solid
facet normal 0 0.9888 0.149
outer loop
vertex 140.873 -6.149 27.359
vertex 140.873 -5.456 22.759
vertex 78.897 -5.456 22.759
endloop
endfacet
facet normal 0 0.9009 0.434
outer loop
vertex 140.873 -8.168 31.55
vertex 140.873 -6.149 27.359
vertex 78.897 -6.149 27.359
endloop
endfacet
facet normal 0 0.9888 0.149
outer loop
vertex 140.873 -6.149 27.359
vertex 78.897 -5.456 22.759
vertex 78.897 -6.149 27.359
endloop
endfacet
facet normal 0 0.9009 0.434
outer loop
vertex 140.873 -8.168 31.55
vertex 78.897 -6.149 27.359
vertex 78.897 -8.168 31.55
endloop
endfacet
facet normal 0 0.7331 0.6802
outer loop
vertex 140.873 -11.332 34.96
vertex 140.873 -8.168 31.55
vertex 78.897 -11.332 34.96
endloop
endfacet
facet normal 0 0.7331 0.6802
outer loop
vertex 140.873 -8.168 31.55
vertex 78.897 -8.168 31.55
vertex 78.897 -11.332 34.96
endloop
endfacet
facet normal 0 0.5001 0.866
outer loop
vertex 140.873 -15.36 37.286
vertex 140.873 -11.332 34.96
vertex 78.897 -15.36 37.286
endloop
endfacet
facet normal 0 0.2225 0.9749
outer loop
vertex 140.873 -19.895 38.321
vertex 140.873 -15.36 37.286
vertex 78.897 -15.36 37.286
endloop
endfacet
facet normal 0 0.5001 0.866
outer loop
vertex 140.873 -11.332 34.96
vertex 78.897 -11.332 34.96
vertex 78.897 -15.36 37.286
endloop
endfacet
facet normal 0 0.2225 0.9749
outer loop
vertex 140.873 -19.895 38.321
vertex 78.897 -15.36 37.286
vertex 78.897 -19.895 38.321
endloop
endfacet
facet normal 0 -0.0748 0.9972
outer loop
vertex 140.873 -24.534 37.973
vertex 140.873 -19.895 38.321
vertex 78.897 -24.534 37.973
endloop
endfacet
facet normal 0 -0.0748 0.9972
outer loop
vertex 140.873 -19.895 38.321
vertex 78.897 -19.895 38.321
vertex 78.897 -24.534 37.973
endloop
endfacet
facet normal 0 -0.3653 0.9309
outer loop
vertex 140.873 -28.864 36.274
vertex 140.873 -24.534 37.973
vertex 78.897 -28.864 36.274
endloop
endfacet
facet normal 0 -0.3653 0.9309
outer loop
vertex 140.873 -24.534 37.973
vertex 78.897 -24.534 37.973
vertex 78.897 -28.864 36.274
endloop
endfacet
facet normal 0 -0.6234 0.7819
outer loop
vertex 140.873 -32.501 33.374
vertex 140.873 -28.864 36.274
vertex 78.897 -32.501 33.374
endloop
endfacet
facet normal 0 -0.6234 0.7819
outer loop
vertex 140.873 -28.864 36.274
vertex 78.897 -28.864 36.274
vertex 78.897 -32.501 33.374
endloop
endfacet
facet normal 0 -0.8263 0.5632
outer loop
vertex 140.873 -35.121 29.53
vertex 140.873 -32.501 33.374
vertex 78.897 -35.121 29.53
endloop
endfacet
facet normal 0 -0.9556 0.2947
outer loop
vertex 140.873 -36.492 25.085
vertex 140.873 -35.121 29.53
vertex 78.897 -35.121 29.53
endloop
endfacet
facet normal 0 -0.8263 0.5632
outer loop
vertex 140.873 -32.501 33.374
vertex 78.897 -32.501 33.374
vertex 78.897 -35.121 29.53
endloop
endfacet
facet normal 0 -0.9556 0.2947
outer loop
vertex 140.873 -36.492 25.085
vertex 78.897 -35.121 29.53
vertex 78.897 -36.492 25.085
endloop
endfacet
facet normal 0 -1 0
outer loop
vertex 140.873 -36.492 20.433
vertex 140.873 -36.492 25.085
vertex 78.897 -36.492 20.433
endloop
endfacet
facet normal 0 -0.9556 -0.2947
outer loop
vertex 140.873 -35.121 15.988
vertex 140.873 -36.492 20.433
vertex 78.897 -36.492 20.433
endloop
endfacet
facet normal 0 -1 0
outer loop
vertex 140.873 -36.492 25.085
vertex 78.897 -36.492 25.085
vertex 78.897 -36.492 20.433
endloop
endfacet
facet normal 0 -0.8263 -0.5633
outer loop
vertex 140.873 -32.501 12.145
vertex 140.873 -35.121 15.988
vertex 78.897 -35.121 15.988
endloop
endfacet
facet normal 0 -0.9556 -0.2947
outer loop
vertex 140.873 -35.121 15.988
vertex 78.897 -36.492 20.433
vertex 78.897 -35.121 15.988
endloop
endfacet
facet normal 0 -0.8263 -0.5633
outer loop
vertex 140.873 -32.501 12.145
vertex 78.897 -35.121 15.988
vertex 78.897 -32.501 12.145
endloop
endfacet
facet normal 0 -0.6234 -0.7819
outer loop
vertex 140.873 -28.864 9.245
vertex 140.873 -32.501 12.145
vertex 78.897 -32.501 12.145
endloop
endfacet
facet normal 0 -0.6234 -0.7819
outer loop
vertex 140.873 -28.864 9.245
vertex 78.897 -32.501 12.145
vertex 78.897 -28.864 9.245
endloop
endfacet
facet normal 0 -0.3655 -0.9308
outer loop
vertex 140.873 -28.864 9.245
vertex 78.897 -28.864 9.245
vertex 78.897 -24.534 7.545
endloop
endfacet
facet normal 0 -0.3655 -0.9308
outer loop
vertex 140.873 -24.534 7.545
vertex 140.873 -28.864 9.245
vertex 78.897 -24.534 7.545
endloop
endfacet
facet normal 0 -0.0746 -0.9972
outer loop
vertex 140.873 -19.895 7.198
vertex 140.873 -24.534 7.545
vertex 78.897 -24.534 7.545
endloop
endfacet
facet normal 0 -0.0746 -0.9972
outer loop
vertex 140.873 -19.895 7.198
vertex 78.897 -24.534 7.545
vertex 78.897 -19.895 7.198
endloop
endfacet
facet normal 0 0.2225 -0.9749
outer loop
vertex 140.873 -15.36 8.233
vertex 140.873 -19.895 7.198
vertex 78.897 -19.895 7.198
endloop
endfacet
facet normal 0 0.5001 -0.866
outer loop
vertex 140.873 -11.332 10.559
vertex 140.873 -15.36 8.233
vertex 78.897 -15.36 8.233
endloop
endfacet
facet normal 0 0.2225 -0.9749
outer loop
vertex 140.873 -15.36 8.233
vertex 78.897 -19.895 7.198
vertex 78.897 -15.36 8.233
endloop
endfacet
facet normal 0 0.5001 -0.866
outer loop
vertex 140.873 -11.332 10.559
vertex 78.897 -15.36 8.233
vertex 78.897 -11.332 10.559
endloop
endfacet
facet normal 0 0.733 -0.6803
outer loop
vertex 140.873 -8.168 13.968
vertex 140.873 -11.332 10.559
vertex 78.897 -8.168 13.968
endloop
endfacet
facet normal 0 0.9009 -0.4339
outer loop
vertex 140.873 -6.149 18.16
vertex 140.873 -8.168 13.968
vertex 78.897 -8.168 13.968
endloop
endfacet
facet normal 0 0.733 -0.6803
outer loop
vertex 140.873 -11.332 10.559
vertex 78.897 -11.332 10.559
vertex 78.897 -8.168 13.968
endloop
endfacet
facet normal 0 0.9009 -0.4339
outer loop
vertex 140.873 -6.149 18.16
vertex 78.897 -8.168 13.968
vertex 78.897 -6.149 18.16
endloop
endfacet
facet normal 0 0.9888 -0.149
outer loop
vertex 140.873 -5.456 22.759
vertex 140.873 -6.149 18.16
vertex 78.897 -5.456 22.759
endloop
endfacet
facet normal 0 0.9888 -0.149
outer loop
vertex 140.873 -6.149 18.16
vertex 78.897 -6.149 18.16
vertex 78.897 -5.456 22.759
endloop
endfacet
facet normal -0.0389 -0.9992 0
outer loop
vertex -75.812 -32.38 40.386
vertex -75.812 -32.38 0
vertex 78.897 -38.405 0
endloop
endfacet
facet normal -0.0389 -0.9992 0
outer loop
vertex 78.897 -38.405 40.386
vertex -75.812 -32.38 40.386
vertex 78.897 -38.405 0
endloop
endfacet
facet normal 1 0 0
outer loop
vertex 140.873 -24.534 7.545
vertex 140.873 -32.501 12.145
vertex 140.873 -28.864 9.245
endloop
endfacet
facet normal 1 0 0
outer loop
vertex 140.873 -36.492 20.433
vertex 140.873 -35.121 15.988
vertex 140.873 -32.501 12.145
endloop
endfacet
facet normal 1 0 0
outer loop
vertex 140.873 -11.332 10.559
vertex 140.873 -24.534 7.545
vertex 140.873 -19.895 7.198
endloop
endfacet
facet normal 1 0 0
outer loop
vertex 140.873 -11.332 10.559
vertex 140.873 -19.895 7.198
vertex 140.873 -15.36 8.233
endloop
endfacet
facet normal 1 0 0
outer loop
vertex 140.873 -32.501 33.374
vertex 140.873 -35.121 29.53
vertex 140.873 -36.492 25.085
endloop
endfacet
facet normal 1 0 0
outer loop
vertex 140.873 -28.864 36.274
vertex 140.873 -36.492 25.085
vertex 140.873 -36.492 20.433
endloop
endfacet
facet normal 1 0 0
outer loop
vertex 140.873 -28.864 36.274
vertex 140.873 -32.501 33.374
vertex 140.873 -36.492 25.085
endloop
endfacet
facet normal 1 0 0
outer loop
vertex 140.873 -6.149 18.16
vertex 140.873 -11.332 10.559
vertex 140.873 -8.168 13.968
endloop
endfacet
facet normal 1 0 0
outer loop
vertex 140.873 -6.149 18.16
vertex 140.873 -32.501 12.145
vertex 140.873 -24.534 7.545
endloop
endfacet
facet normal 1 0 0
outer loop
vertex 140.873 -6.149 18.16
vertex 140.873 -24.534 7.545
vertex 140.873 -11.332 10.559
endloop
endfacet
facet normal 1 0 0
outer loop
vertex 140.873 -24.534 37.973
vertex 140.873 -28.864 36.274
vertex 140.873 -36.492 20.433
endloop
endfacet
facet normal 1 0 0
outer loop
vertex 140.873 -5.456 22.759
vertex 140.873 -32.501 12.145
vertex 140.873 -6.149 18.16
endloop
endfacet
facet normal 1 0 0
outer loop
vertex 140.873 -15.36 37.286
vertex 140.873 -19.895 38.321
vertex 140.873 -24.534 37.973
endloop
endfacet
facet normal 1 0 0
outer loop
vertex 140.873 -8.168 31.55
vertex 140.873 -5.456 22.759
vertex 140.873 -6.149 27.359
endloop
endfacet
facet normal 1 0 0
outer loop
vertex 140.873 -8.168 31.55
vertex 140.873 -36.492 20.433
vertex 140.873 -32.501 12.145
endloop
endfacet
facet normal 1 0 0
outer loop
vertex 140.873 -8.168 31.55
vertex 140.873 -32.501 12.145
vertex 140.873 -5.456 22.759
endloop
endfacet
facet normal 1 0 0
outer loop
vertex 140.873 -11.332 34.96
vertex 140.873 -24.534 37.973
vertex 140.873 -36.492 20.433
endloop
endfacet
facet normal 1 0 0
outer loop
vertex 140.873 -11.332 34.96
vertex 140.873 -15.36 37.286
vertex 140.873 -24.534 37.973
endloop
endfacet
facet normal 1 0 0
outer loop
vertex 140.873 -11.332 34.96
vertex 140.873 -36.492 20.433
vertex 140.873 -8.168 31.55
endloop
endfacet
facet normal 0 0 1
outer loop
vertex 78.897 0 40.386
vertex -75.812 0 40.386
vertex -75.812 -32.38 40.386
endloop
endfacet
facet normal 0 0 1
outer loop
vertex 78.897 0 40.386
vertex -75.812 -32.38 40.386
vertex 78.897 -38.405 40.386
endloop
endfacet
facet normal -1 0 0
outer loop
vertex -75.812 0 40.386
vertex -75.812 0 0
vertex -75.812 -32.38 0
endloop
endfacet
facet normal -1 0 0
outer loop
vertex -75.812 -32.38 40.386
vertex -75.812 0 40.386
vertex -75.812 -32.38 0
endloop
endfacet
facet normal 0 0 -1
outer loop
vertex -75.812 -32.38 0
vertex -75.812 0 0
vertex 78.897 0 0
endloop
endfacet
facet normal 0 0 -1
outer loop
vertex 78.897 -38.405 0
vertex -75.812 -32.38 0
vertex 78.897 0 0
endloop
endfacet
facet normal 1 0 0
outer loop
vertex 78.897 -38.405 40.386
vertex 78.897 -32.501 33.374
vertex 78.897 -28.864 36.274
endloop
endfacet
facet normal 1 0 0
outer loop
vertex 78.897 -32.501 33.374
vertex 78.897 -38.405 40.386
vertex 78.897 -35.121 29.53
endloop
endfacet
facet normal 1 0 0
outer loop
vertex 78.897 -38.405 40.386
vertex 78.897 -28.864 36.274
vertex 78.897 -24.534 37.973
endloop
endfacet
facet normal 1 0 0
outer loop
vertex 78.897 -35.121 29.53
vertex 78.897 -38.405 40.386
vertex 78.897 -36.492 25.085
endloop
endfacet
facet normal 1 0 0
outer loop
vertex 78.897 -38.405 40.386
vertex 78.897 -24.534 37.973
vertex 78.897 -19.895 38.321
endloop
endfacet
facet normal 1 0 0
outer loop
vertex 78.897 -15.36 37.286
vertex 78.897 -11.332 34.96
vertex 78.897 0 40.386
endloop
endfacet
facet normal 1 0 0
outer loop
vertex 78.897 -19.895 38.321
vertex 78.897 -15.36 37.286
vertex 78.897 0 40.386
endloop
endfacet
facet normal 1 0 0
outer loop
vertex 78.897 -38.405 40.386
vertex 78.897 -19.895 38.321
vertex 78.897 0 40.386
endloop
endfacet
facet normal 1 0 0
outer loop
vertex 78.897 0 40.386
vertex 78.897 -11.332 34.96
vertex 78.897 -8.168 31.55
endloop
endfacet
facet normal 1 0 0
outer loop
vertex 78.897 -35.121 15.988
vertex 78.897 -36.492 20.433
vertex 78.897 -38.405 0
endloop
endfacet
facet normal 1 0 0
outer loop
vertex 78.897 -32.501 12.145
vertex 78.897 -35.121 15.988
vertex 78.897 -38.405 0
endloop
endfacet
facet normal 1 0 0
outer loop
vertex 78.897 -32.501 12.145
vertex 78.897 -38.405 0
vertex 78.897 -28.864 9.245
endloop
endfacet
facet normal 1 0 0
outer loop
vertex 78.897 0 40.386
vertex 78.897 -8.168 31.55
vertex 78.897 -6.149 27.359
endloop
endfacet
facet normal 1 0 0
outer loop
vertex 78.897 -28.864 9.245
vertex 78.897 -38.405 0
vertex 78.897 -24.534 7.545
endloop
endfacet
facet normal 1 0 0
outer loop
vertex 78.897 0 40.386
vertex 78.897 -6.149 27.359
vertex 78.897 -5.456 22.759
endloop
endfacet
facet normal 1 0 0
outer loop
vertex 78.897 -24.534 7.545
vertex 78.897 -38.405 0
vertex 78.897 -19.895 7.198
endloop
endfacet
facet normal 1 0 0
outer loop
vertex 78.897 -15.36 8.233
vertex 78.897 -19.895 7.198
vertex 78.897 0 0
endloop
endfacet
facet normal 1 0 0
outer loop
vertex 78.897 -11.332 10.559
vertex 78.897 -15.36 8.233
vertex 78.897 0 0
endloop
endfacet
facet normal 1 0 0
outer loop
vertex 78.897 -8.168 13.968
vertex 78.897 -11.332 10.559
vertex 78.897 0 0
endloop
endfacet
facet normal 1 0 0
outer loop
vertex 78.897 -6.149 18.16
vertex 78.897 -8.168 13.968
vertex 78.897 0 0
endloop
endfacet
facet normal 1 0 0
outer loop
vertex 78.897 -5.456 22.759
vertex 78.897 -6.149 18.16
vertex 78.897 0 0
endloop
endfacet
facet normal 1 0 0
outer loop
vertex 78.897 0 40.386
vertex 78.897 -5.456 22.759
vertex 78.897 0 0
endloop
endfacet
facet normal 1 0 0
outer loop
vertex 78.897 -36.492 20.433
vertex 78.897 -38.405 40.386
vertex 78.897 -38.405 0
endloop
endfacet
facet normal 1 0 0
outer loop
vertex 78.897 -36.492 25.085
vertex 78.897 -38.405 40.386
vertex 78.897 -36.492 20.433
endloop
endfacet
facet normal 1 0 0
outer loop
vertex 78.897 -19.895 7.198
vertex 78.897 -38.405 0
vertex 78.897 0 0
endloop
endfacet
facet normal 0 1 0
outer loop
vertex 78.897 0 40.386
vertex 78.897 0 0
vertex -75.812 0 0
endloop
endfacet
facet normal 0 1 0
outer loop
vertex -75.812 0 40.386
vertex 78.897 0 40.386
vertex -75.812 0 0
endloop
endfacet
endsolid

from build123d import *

# Parameters (mm, degrees)
F1_DEPTH = 40.386
F2_R     = 15.605309
F3_DEPTH = 61.976


with BuildPart() as f1:
    # F0 (on Top) → F1 (new body)
    with BuildSketch(Plane.XY):
        Polygon((78.89688, 0), (-75.812049, 0), (-75.812049, -32.37997), (78.89688, -38.405467), align=None)
    extrude(amount=F1_DEPTH)

    # F2 (on face) → F3 (join)
    with BuildSketch(Plane.YZ.offset(78.89688)):
        with Locations((-21.061413, 22.759276)):
            Circle(F2_R)
    extrude(amount=F3_DEPTH)


solid = f1.part
